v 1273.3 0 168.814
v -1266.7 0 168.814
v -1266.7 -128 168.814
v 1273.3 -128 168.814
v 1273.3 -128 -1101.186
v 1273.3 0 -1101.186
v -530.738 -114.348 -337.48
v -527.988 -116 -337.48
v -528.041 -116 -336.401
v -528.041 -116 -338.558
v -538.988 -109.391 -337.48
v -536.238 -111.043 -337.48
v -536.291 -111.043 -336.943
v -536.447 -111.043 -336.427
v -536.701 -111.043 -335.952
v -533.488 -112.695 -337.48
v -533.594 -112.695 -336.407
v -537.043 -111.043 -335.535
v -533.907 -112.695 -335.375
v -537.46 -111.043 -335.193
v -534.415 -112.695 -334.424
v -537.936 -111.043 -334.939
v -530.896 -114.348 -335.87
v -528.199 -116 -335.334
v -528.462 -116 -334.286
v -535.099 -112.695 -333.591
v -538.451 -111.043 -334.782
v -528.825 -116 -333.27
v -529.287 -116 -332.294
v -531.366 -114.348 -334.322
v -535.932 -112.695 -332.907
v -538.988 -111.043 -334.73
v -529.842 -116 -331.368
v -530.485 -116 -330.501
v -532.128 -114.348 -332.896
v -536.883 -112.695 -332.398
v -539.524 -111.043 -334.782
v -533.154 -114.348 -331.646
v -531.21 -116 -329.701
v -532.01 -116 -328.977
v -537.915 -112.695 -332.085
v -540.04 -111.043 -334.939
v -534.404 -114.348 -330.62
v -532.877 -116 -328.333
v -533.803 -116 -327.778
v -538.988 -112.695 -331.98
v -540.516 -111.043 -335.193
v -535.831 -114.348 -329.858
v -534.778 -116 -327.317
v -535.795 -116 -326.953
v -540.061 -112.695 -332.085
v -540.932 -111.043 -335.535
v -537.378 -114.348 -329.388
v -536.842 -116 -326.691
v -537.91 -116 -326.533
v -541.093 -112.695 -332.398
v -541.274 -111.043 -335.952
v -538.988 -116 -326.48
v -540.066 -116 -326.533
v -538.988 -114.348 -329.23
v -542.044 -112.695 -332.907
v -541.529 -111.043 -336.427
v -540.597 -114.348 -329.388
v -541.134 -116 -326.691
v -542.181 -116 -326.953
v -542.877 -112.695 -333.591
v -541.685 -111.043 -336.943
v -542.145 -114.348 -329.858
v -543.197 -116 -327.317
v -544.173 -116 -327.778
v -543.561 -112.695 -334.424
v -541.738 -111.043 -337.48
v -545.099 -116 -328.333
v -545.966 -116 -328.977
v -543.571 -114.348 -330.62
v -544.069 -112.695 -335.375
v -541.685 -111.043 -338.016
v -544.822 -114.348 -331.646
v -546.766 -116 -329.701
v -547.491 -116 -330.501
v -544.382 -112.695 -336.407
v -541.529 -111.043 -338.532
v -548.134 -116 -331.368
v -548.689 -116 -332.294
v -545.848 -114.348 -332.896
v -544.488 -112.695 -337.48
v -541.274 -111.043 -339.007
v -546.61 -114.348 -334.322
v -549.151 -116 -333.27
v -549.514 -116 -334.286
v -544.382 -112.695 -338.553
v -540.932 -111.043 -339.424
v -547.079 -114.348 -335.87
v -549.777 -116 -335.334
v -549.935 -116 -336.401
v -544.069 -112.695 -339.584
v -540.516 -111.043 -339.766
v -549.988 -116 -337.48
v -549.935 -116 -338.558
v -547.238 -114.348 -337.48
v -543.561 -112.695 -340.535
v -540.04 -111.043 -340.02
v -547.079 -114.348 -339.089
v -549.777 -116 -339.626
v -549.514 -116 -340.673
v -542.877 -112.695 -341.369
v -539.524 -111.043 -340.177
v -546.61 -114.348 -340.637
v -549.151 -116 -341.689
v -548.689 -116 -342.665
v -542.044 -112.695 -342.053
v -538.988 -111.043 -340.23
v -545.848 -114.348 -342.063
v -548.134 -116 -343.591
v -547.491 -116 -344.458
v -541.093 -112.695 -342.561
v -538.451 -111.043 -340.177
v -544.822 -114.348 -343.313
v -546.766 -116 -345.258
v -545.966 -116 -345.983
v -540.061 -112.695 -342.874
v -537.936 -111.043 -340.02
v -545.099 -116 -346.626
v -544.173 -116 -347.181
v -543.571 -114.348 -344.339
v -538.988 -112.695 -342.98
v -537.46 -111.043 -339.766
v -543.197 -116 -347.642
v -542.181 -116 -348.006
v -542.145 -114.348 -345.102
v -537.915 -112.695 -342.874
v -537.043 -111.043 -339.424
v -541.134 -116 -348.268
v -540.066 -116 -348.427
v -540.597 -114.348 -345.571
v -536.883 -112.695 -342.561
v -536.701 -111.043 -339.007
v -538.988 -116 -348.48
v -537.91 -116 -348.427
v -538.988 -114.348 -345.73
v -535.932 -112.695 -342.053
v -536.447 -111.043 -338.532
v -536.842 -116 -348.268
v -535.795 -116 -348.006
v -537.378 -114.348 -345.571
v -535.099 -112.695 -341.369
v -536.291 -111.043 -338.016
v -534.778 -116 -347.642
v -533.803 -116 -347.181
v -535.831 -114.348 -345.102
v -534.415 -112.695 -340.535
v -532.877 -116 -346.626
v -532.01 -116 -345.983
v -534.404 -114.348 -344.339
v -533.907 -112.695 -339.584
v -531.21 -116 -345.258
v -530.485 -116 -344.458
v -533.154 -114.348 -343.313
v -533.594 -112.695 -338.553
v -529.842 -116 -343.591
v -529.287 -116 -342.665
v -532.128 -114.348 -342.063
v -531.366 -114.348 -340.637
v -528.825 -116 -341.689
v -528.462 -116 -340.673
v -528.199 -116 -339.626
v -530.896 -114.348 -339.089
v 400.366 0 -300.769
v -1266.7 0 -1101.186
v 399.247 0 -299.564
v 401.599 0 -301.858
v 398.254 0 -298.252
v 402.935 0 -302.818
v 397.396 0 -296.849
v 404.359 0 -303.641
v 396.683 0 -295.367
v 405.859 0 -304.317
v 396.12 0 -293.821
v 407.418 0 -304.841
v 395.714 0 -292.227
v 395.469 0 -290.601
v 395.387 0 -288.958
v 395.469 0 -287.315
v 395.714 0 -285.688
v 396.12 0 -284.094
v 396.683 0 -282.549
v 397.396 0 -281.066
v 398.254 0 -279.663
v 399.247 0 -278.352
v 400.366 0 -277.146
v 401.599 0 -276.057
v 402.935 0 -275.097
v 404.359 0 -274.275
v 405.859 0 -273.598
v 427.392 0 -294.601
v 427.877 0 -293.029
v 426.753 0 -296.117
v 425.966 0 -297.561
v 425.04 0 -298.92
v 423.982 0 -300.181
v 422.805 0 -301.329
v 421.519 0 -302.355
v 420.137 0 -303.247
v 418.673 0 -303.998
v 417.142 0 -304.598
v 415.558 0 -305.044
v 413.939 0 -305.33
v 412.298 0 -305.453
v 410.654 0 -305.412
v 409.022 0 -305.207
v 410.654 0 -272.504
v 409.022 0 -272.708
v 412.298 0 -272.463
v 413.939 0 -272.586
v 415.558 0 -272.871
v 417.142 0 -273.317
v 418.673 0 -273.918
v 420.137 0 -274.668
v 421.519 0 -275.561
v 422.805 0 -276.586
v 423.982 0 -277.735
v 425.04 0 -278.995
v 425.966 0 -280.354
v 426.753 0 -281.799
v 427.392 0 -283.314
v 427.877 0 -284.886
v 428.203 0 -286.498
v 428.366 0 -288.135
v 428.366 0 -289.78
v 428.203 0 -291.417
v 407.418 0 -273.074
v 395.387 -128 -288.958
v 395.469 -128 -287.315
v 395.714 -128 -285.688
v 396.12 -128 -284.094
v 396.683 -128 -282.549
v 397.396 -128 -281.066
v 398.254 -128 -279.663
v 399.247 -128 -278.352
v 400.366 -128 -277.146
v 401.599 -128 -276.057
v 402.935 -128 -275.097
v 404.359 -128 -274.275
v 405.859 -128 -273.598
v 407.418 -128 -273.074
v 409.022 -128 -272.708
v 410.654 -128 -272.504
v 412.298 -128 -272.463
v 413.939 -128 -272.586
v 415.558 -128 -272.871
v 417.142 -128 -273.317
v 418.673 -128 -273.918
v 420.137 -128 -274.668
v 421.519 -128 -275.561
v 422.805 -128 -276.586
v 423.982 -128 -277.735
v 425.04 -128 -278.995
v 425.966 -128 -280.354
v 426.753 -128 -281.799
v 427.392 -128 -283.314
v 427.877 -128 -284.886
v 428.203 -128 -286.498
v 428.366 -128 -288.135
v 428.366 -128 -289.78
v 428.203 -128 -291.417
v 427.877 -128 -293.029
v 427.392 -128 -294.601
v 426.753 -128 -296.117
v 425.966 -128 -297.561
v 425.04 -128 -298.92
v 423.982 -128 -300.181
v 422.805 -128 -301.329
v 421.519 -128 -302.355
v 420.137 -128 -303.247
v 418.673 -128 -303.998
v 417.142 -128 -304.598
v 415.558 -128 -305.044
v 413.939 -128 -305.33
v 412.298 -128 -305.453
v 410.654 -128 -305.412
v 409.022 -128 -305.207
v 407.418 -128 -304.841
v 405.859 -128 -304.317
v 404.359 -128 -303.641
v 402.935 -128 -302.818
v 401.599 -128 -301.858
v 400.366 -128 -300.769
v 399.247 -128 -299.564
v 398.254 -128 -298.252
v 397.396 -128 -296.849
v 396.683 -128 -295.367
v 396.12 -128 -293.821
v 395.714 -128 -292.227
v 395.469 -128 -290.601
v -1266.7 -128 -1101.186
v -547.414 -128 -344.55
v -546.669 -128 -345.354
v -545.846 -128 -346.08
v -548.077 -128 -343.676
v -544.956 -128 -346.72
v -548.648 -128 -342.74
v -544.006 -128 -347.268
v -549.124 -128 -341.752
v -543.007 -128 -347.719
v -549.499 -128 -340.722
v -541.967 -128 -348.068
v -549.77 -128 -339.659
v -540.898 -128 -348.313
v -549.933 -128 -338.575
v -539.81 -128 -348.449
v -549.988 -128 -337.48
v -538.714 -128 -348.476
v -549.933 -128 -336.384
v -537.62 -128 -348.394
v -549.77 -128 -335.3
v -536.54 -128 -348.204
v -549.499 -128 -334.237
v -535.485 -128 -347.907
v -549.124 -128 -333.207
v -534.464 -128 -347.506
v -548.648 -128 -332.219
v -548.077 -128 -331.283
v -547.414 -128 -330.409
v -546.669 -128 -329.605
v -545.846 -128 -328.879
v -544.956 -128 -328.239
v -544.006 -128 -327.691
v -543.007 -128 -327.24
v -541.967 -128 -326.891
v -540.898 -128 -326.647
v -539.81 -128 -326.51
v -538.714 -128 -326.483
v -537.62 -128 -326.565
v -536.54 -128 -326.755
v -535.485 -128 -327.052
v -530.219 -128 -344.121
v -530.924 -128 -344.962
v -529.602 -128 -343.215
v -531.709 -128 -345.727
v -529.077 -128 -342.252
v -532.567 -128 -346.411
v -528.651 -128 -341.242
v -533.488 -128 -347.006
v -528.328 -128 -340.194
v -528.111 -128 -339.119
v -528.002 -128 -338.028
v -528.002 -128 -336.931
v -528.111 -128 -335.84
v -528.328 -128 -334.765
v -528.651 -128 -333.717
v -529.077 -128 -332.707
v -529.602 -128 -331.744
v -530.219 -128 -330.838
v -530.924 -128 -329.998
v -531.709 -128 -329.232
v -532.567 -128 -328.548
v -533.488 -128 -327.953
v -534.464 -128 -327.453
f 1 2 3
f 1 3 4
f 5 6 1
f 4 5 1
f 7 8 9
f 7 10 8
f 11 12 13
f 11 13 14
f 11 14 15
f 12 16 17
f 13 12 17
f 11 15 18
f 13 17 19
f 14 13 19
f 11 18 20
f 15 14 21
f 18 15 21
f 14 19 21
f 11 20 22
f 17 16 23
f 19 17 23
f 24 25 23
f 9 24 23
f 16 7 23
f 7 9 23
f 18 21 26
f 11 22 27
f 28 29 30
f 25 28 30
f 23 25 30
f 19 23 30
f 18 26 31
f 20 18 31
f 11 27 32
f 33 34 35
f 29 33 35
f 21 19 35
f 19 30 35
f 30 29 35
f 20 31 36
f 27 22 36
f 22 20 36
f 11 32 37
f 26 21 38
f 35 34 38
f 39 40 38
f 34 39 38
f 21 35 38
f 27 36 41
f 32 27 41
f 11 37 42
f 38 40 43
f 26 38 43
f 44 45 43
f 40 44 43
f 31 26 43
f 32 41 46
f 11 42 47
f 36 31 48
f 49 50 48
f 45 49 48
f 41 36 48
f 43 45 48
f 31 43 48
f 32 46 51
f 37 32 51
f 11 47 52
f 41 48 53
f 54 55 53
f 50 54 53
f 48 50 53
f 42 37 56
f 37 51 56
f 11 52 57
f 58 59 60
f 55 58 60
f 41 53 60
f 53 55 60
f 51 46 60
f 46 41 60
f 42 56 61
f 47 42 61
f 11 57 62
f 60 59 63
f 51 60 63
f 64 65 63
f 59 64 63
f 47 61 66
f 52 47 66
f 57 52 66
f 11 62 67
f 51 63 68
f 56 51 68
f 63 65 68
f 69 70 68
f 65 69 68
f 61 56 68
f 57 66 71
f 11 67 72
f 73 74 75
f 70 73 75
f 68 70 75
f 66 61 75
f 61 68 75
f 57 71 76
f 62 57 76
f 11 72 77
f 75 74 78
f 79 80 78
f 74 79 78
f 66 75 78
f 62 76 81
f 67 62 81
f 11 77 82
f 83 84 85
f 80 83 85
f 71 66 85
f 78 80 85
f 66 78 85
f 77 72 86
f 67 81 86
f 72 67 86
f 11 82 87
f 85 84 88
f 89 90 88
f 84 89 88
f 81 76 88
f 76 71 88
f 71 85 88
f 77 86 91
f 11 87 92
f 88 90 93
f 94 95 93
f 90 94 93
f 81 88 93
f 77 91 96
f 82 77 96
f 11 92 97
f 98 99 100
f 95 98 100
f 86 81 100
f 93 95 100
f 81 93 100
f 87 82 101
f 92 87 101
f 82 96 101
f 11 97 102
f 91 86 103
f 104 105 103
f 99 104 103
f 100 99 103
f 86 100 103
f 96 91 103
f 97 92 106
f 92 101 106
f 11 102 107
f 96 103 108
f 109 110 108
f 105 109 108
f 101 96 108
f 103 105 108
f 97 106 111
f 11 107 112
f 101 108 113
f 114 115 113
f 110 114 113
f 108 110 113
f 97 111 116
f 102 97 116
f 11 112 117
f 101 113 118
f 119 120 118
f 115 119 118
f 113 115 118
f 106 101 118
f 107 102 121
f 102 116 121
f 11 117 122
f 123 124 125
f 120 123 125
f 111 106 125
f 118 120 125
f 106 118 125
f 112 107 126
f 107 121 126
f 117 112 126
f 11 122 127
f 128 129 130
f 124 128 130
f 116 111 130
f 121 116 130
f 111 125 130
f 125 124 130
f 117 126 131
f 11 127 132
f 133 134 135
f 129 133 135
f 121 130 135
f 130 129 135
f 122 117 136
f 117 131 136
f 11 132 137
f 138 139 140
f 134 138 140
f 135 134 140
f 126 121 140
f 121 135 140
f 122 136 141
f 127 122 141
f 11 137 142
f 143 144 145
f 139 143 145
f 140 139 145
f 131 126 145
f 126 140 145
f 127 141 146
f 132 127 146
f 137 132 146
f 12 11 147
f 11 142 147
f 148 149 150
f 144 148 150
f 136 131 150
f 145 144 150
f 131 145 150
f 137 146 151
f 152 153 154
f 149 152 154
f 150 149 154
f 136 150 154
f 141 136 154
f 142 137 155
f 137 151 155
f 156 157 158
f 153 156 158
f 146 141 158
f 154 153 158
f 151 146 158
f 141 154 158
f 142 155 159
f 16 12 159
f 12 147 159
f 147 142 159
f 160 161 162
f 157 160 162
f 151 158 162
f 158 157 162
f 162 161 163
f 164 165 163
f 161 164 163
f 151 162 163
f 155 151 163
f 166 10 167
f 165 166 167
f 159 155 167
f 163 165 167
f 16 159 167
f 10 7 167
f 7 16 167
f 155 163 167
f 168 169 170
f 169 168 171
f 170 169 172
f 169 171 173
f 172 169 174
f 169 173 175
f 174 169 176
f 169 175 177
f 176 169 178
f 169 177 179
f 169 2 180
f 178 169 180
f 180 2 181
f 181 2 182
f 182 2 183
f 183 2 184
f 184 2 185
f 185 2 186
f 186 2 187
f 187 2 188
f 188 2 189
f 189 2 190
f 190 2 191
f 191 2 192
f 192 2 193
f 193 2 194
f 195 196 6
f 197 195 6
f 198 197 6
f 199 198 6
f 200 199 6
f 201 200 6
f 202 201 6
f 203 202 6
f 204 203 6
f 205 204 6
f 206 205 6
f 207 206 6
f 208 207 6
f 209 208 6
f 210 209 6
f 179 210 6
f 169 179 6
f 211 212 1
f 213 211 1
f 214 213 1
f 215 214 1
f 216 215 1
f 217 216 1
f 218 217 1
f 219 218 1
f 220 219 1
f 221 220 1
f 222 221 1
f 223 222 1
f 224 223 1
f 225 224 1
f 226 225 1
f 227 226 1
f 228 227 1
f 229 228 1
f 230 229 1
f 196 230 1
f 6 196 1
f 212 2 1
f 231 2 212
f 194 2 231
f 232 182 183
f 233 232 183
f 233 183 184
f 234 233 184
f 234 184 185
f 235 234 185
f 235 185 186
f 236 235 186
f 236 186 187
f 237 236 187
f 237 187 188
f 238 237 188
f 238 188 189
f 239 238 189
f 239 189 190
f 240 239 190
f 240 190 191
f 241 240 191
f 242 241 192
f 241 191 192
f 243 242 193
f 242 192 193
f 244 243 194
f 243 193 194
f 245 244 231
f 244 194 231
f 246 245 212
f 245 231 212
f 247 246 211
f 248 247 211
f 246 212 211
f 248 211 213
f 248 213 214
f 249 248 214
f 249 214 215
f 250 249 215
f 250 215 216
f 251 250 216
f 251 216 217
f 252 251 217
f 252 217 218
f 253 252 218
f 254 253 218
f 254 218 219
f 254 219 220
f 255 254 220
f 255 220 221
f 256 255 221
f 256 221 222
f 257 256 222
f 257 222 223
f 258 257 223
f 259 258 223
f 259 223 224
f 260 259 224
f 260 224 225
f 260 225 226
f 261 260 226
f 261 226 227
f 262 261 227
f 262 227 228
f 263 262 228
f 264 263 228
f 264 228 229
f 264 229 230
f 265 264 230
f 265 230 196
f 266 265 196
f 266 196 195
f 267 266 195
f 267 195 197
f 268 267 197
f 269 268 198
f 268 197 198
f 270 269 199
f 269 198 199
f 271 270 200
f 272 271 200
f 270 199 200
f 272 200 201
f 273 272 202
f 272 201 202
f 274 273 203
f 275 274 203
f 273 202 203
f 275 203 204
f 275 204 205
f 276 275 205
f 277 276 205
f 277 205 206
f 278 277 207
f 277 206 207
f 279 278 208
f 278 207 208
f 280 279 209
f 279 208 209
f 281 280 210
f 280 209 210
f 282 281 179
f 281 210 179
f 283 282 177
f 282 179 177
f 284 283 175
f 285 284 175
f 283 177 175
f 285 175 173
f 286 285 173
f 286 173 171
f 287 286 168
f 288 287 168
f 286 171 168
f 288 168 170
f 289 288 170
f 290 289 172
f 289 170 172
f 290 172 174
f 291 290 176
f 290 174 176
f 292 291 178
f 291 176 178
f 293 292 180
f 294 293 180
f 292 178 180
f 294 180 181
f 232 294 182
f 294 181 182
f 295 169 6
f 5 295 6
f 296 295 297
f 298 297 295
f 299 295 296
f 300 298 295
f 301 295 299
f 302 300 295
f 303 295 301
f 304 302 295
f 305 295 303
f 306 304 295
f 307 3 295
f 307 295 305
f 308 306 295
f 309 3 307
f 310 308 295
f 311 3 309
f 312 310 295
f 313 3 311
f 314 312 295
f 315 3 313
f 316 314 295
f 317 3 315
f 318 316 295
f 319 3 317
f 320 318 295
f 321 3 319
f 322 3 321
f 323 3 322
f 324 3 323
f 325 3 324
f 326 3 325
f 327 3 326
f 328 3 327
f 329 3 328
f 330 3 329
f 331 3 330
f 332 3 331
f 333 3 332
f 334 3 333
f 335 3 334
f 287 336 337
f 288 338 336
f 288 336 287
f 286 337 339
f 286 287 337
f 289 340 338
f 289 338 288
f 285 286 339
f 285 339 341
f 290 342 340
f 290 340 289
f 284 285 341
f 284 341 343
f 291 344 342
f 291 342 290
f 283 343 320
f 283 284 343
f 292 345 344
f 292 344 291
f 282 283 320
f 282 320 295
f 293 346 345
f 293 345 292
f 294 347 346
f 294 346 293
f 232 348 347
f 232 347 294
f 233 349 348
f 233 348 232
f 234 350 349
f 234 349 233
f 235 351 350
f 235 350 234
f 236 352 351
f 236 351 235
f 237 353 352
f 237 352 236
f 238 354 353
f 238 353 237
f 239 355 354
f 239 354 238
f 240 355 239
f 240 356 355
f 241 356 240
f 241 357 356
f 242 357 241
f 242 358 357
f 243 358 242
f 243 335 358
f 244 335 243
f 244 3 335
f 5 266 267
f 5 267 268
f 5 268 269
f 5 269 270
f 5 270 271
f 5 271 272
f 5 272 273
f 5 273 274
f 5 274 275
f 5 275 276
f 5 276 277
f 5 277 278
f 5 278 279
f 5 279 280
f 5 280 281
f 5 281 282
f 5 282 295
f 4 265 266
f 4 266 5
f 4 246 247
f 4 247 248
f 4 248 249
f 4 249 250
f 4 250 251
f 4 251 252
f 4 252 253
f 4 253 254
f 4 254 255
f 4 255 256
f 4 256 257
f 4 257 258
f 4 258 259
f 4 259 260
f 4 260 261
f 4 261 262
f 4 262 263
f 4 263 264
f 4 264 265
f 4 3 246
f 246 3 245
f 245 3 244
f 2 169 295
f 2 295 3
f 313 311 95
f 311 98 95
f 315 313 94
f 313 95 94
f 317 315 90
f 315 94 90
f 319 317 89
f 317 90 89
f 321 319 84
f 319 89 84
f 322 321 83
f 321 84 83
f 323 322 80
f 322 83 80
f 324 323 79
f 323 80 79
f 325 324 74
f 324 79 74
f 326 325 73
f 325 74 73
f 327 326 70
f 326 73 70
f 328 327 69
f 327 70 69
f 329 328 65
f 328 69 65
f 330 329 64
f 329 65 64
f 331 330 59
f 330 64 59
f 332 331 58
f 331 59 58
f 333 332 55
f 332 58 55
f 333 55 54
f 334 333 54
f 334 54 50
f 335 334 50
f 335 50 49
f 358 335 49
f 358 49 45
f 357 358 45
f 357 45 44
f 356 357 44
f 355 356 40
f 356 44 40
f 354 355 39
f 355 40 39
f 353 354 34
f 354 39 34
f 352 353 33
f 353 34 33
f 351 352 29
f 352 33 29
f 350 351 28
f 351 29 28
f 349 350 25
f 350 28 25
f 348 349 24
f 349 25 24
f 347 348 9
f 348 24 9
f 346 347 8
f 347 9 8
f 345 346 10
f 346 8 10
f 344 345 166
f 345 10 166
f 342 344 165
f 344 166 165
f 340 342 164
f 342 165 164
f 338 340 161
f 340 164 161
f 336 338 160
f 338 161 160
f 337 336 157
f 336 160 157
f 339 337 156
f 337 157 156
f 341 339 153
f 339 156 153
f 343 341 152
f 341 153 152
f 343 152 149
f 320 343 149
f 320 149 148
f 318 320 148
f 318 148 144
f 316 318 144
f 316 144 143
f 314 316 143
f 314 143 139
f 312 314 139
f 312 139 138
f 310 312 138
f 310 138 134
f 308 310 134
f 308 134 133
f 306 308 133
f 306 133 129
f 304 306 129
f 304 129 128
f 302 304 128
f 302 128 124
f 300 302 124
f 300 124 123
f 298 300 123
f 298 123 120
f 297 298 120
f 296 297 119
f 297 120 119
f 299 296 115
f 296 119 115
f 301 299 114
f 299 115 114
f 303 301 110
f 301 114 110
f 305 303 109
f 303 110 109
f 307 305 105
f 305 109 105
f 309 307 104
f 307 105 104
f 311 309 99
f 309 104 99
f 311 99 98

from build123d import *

# Parameters (mm, degrees)
F0_W     = 2540
F0_H     = 1270
F1_DEPTH = 128
F3_D     = 22
F3_DEPTH = 12
F3_TIP   = 6.6094668093
F5_D     = 33


with BuildPart() as f1:
    # F0 (on Front) → F1 (new body)
    with BuildSketch(Plane.XZ):
        with Locations((3.2995678484, -466.1856472778)):
            Rectangle(F0_W, F0_H)
    extrude(amount=F1_DEPTH)

    # F3
    with Locations(Plane.XZ.offset(128)):
        with Locations((-538.9879345894, -337.479621172)):
            Hole(F3_D / 2, depth=F3_DEPTH)
            with Locations((0, 0, -(F3_DEPTH + F3_TIP / 2))):  # 118° drill point
                Cone(0, F3_D / 2, F3_TIP, mode=Mode.SUBTRACT)

    # F5 (through all)
    with Locations(Plane.XZ.offset(128)):
        with Locations((411.8869006634, -288.9576852322)):
            Hole(F5_D / 2)


solid = f1.part
